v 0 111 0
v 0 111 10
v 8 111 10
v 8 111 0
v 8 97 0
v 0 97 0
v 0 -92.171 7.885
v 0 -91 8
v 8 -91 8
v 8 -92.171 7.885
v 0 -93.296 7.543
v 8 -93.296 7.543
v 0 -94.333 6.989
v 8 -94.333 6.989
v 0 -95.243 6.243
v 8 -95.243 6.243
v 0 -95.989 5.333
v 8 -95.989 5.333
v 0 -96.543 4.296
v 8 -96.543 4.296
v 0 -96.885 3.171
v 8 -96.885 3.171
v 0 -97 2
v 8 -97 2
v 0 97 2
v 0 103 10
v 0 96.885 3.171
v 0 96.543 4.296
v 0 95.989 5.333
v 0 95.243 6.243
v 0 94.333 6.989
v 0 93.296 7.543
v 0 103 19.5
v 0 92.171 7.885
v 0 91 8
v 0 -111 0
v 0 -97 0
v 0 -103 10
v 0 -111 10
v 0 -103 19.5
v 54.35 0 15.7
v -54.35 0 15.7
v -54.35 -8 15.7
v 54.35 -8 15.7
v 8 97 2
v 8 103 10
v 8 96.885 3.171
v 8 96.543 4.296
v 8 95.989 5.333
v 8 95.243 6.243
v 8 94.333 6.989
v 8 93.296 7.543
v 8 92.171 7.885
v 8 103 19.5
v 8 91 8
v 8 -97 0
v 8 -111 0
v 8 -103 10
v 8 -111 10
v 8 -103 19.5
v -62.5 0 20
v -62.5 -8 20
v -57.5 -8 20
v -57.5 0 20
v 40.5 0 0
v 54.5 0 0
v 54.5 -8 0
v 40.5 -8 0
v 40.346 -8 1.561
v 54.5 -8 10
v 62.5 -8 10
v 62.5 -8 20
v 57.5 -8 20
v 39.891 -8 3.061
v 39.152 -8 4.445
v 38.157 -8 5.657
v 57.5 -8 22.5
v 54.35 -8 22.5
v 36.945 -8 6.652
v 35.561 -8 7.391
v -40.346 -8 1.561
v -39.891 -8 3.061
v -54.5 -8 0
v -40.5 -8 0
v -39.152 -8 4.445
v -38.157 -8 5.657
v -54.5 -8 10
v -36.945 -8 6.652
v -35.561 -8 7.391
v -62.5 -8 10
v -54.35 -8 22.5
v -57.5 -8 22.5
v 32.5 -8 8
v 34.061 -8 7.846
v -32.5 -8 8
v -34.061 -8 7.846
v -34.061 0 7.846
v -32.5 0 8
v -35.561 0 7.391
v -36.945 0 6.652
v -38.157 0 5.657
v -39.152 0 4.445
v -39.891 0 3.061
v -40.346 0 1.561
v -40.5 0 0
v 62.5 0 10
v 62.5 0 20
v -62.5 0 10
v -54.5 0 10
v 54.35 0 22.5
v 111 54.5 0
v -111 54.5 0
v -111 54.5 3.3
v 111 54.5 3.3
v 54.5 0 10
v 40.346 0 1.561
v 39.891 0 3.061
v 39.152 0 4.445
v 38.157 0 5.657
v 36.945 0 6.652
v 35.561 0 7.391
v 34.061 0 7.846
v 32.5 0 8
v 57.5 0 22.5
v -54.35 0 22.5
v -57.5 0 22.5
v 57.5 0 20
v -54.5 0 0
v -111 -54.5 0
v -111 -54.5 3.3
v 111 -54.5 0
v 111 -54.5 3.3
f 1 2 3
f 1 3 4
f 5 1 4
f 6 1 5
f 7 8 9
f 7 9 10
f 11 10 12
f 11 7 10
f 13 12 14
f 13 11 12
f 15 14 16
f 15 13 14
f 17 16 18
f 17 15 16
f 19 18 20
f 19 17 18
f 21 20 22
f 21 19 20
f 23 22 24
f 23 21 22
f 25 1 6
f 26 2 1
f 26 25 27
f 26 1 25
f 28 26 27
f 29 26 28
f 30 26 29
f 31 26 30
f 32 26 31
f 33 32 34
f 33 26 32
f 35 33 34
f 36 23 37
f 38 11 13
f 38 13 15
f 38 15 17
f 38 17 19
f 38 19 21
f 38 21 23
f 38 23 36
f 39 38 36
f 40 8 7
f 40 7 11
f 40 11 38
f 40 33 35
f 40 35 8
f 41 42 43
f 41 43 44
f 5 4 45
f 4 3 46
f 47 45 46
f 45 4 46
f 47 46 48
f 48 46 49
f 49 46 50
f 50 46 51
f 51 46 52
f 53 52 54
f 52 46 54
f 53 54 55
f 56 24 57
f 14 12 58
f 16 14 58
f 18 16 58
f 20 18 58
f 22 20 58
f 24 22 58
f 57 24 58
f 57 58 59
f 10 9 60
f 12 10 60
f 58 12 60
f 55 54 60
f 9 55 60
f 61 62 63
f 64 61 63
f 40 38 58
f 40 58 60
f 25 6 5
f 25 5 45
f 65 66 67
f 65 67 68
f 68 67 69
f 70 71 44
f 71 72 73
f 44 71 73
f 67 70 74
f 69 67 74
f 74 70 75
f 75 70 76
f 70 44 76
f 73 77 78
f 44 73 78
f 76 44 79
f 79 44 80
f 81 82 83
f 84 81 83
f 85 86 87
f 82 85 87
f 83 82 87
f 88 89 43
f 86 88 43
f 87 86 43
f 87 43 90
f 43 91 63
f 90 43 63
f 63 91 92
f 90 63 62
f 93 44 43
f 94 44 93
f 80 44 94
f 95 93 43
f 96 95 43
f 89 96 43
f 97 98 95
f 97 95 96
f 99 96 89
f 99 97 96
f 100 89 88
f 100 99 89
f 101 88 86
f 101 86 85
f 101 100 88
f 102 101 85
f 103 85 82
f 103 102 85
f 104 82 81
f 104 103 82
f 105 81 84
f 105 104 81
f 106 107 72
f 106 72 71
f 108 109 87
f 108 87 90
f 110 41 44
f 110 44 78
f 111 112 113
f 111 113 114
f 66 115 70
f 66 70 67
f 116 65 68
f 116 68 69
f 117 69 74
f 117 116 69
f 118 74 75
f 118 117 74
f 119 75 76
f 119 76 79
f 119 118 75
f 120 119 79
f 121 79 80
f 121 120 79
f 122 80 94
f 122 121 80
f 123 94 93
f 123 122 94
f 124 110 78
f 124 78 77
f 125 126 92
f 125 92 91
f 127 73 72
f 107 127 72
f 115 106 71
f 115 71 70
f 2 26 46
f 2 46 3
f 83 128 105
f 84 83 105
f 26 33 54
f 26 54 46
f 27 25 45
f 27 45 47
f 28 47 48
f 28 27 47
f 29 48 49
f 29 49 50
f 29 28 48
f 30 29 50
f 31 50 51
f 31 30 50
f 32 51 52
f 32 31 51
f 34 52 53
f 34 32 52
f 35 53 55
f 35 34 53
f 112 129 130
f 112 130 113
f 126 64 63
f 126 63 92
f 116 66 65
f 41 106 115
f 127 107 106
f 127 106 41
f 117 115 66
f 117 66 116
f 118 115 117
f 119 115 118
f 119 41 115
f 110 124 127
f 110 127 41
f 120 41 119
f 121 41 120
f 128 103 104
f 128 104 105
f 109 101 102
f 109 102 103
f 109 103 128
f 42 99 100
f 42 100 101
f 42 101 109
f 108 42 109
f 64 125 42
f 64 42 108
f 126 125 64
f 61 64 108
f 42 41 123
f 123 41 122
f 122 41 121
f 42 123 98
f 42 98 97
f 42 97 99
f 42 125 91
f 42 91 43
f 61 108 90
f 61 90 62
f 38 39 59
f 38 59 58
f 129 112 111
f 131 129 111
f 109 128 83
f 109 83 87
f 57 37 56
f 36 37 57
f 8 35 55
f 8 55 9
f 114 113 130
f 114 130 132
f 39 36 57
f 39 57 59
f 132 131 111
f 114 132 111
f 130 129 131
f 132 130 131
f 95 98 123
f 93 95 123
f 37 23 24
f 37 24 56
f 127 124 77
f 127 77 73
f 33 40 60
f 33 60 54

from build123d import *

# Parameters (mm, degrees)
PAD_DEPTH    = 8
PAD001_DEPTH = 8
SKETCH004_W  = 222
SKETCH004_H  = 109
PAD002_DEPTH = 3.3


with BuildPart() as body003:
    # Sketch → Pad (new body)
    with BuildSketch(Plane.YZ):
        with BuildLine():
            Line((-111, 0), (-111, 10))
            Line((-111, 10), (-103, 10))
            Line((-103, 10), (-103, 19.5))
            Line((-103, 19.5), (103, 19.5))
            Line((103, 19.5), (103, 10))
            Line((103, 10), (111, 10))
            Line((111, 10), (111, 0))
            Line((111, 0), (97, 0))
            Line((97, 0), (97, 2))
            ThreePointArc((97, 2), (95.24264, 6.242641), (91, 8))
            Line((91, 8), (-90.999979, 8))
            ThreePointArc((-90.999979, 8), (-95.242633, 6.242648), (-97, 2))
            Line((-97, 2), (-97, 0))
            Line((-97, 0), (-111, 0))
        make_face()
    extrude(amount=PAD_DEPTH)


with BuildPart() as body004:
    # Sketch001 → Pad001 (new body)
    with BuildSketch(Plane.XZ):
        with BuildLine():
            Line((-54.5, 0), (-54.5, 10))
            Line((-54.5, 10), (-62.5, 10))
            Line((-62.5, 10), (-62.5, 20))
            Line((-62.5, 20), (-57.5, 20))
            Line((-57.5, 20), (-57.5, 22.5))
            Line((-57.5, 22.5), (-54.35, 22.5))
            Line((-54.35, 22.5), (-54.35, 15.7))
            Line((-54.35, 15.7), (54.35, 15.7))
            Line((54.35, 15.7), (54.35, 22.5))
            Line((54.35, 22.5), (57.5, 22.5))
            Line((57.5, 22.5), (57.5, 20))
            Line((57.5, 20), (62.5, 20))
            Line((62.5, 20), (62.5, 10))
            Line((62.5, 10), (54.5, 10))
            Line((54.5, 10), (54.5, 0))
            Line((54.5, 0), (40.5, 0))
            ThreePointArc((40.5, 0), (38.156854, 5.656854), (32.5, 8))
            Line((-32.5, 8), (32.5, 8))
            ThreePointArc((-32.5, 8), (-38.156854, 5.656854), (-40.5, 0))
            Line((-54.5, 0), (-40.5, 0))
        make_face()
    extrude(amount=PAD001_DEPTH)


with BuildPart() as body:
    # Sketch004 → Pad002 (new body)
    with BuildSketch(Plane.XY):
        Rectangle(SKETCH004_W, SKETCH004_H)
    extrude(amount=PAD002_DEPTH)


solid = Compound([body003.part, body004.part, body.part])
